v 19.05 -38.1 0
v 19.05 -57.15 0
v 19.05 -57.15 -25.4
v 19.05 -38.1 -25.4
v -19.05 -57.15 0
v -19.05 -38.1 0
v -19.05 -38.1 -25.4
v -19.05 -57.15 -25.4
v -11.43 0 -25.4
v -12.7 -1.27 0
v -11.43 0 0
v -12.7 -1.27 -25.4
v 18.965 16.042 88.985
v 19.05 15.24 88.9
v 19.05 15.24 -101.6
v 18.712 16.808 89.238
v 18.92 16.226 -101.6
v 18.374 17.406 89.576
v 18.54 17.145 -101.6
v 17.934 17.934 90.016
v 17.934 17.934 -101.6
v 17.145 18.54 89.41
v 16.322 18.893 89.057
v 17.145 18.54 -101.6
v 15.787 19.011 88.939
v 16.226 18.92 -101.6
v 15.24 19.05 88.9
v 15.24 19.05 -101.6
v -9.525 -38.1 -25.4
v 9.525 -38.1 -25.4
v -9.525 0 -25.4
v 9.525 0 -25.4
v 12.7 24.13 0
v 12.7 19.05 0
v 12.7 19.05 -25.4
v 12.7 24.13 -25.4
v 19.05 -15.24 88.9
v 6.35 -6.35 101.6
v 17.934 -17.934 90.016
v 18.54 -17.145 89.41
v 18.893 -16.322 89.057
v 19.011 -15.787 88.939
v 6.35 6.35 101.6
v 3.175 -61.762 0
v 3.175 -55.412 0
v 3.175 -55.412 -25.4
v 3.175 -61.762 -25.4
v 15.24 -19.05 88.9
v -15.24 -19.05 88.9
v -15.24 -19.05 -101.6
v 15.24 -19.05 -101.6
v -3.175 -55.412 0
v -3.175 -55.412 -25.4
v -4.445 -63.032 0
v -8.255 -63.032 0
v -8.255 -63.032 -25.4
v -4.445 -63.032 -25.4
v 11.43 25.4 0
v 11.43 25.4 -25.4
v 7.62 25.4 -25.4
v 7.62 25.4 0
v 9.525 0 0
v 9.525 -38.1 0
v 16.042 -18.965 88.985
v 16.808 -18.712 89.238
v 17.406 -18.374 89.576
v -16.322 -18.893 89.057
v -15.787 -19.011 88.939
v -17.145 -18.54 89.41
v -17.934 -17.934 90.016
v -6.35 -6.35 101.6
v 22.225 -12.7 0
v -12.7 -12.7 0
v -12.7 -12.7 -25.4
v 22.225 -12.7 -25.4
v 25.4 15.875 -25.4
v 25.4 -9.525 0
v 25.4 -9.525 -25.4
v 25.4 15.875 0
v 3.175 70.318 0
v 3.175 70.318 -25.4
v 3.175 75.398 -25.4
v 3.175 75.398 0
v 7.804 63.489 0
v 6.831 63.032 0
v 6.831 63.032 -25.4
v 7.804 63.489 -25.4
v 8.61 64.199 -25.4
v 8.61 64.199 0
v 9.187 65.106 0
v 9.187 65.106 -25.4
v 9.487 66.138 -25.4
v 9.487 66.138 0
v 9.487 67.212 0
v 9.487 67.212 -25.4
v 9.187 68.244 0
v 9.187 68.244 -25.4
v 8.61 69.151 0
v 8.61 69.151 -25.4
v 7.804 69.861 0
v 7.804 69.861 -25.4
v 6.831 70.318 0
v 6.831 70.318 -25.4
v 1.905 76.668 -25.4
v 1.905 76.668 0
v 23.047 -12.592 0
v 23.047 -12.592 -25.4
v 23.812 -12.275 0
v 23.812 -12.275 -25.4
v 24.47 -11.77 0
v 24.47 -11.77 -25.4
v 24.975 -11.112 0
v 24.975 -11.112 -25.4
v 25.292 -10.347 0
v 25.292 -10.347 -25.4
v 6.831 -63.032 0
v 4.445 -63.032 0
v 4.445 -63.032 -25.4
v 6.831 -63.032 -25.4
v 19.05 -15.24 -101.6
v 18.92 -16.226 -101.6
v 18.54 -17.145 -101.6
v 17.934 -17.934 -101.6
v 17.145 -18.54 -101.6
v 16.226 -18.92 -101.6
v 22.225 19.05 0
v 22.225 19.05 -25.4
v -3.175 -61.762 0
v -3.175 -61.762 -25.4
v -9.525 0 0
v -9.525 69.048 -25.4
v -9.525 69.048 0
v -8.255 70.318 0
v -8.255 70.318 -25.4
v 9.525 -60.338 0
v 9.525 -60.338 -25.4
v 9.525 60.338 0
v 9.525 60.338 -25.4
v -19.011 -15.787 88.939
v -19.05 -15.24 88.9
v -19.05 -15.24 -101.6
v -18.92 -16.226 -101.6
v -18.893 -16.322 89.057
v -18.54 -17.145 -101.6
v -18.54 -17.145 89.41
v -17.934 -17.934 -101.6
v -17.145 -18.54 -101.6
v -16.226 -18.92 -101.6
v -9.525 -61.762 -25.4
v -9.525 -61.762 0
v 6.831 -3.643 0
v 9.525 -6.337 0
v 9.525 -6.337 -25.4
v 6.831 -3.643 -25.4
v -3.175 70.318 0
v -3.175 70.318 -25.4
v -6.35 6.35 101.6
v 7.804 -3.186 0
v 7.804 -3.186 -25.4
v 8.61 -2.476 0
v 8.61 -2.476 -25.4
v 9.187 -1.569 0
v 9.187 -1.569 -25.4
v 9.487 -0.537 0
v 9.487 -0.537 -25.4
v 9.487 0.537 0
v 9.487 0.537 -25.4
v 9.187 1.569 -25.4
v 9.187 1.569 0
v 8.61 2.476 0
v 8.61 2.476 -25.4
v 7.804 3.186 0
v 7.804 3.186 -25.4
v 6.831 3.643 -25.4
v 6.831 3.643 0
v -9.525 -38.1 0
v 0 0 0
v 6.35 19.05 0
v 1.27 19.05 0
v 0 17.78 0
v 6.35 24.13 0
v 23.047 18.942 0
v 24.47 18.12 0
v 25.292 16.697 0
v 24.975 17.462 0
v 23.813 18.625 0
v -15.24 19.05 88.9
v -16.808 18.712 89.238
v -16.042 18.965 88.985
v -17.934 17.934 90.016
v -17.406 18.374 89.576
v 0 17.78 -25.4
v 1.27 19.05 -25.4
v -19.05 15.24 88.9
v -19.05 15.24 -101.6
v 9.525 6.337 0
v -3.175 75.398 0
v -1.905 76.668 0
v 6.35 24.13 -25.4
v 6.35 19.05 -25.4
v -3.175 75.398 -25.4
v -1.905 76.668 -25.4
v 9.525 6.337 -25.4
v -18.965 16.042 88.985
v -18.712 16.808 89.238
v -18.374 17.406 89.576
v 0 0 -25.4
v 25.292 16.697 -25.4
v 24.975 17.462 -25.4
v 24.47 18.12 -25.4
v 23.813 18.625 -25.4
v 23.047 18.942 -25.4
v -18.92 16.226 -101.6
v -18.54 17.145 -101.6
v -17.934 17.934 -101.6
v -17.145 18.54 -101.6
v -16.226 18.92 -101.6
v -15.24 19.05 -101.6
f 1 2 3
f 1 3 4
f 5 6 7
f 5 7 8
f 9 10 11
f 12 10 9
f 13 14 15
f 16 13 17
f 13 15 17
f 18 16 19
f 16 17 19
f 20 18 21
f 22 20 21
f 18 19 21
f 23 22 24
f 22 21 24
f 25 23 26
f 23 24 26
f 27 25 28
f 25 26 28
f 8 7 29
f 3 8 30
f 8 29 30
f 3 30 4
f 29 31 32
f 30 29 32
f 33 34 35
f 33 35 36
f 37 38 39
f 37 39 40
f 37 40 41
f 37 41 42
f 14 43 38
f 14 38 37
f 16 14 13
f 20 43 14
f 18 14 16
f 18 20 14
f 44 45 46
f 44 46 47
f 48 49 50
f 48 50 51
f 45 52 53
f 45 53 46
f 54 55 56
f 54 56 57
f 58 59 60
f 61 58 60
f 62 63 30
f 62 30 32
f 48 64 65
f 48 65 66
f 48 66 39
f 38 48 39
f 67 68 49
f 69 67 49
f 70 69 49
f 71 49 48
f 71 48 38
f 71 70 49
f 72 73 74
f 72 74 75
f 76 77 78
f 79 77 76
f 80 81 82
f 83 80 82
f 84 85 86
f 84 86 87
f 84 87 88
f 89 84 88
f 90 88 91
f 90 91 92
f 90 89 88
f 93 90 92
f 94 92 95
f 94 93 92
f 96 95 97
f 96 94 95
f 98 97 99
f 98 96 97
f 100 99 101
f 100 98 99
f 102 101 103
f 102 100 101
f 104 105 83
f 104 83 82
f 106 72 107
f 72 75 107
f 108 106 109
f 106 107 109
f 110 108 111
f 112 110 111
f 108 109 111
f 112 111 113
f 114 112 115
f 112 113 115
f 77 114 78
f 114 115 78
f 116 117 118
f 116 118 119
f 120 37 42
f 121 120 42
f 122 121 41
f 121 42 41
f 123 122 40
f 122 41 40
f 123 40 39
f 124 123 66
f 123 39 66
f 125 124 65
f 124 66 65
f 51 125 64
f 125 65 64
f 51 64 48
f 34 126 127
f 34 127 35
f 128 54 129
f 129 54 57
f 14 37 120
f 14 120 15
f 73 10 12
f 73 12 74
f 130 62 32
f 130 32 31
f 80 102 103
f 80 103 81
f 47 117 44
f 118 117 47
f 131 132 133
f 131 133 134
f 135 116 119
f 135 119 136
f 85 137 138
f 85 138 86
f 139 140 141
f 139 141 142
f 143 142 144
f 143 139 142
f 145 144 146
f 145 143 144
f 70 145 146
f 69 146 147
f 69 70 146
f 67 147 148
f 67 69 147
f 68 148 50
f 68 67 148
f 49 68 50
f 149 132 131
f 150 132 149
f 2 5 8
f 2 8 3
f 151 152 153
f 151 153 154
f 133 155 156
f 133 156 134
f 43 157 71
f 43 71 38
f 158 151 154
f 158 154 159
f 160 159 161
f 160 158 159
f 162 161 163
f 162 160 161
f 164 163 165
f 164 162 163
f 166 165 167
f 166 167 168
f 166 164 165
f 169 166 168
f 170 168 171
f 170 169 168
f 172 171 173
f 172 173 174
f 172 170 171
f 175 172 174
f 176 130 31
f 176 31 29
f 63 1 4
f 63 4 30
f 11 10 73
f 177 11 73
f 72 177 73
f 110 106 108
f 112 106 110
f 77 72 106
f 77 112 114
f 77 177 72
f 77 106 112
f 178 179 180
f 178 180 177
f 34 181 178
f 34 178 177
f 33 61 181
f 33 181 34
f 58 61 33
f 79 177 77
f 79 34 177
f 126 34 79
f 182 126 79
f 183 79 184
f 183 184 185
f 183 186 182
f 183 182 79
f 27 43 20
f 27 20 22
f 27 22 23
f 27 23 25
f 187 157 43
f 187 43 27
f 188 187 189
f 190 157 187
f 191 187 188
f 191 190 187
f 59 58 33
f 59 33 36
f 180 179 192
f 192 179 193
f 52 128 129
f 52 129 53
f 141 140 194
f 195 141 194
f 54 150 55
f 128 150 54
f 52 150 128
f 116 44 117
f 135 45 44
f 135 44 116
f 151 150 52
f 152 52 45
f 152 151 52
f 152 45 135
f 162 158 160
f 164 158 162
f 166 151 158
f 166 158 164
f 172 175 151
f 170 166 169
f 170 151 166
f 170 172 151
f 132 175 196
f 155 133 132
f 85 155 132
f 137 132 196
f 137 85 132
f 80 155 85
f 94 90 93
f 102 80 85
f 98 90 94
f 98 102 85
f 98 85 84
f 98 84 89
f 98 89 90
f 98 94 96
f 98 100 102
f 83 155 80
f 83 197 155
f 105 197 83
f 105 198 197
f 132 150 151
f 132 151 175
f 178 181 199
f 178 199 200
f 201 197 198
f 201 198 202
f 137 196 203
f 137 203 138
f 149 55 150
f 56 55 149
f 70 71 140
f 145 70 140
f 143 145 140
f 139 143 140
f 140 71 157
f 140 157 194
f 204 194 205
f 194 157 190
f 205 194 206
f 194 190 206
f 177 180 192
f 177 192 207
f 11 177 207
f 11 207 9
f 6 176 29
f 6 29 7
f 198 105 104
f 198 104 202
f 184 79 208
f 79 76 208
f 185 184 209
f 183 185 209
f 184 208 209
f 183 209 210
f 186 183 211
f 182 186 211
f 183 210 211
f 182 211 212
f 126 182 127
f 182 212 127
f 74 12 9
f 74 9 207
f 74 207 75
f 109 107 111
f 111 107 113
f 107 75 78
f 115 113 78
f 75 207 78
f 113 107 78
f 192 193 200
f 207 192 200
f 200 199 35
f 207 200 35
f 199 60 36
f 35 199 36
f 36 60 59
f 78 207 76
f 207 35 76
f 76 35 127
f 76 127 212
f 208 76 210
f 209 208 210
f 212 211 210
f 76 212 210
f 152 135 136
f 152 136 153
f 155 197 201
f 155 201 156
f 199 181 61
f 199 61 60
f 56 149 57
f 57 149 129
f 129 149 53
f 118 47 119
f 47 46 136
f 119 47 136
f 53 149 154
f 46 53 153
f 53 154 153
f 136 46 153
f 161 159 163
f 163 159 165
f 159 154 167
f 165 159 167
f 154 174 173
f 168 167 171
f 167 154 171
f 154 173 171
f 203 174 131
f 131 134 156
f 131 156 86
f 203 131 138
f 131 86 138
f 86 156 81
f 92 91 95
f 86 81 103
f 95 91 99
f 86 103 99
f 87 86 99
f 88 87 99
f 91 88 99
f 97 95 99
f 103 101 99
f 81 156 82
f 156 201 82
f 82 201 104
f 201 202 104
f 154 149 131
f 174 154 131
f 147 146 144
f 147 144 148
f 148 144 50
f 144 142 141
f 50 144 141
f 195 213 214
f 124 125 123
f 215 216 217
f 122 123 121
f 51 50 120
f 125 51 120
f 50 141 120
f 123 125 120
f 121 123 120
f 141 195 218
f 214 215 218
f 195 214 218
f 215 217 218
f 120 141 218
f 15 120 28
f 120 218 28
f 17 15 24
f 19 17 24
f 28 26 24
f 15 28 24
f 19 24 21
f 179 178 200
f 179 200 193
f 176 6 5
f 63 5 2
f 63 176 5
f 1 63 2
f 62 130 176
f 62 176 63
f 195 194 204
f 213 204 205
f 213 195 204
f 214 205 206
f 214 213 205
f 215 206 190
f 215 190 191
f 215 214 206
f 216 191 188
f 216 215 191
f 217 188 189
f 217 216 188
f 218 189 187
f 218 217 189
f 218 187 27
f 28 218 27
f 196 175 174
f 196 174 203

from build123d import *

# Parameters (mm, degrees)
F1_DEPTH      = 25.4
F2_SIZE       = 1.27
F4_DEPTH      = 25.4
F5_SIZE       = 1.27
F6_R          = 3.175
F7_W          = 38.1
F7_H          = 38.1
F8_DEPTH      = 101.6
F9_R          = 3.81
F10_T1_DEPTH  = 95.8007478943
F10_T3_DEPTH  = 95.8007478943
F10_T8_ANGLE  = 90
F10_T13_ANGLE = 90
F10_T18_ANGLE = 90
F10_T23_ANGLE = 90
F10_T28_ANGLE = 90
F10_T33_ANGLE = 90
F10_T38_ANGLE = 90
F10_T43_ANGLE = 90
F12_DEPTH     = 25.4


# Not quite as in the source:
# - a fillet or chamfer that OpenCascade refuses, or shapes differently, is made with other operations: its cross-section is extruded or revolved along the edge and cut away or added


with BuildPart() as f1:
    # F0 (on Top) → F1 (new body)
    with BuildSketch(Plane.XY):
        with BuildLine():
            Line((-3.175, -63.0320869496), (-3.175, -55.4120869496))
            Line((-3.175, -55.4120869496), (3.175, -55.4120869496))
            Line((3.175, -55.4120869496), (3.175, -63.0320869496))
            Line((3.175, -63.0320869496), (6.8309231637, -63.0320869496))
            Line((6.8309231637, -63.0320869496), (9.525, -60.3380101133))
            Line((9.525, -60.3380101133), (9.525, -6.3369898867))
            Line((9.525, -6.3369898867), (6.8309231637, -3.6429130504))
            ThreePointArc((6.8309231637, -3.6429130504), (9.525, 0), (6.8309231637, 3.6429130504))
            Line((6.8309231637, 3.6429130504), (9.525, 6.3369898867))
            Line((9.525, 6.3369898867), (9.525, 60.3380101133))
            Line((9.525, 60.3380101133), (6.8309231637, 63.0320869496))
            ThreePointArc((6.8309231637, 63.0320869496), (9.525, 66.675), (6.8309231637, 70.3179130504))
            Line((6.8309231637, 70.3179130504), (3.175, 70.3179130504))
            Line((3.175, 70.3179130504), (3.175, 76.6679130504))
            Line((3.175, 76.6679130504), (-3.175, 76.6679130504))
            Line((-3.175, 76.6679130504), (-3.175, 70.3179130504))
            Line((-3.175, 70.3179130504), (-9.525, 70.3179130504))
            Line((-9.525, 70.3179130504), (-9.525, -63.0320869496))
            Line((-9.525, -63.0320869496), (-3.175, -63.0320869496))
        make_face()
    extrude(amount=-F1_DEPTH)

    # F2
    f2_edges = [f1.edges().sort_by_distance(p)[0] for p in [
        (-3.175, 76.667913, -12.7),
        (-9.525, 70.317913, -12.7),
        (3.175, 76.667913, -12.7),
        (-9.525, -63.032087, -12.7),
        (-3.175, -63.032087, -12.7),
        (3.175, -63.032087, -12.7),
    ]]
    chamfer(f2_edges, length=F2_SIZE)


with BuildPart() as f4:
    # F3 (on Top) → F4 (new body)
    with BuildSketch(Plane.XY):
        Polygon((0, 19.05), (0, 0), (-12.7, 0), (-12.7, -12.7), (25.4, -12.7), (25.4, 19.05), (12.7, 19.05), (12.7, 25.4), (6.35, 25.4), (6.35, 19.05), align=None)
    extrude(amount=-F4_DEPTH)

    # F5
    f5_edges = [f4.edges().sort_by_distance(p)[0] for p in [
        (12.7, 25.4, -12.7),
        (6.35, 25.4, -12.7),
        (0, 19.05, -12.7),
        (-12.7, 0, -12.7),
    ]]
    chamfer(f5_edges, length=F5_SIZE)

    # F6
    f6_edges = [f4.edges().sort_by_distance(p)[0] for p in [
        (25.4, 19.05, -12.7),
        (25.4, -12.7, -12.7),
    ]]
    fillet(f6_edges, radius=F6_R)


with BuildPart() as f8:
    # F7 (on Top) → F8 (new body, symmetric)
    with BuildSketch(Plane.XY):
        Rectangle(F7_W, F7_H)
    extrude(amount=F8_DEPTH, both=True)

    # F9
    f9_edges = [f8.edges().sort_by_distance(p)[0] for p in [
        (-19.05, -19.05, 0),
        (19.05, -19.05, 0),
        (19.05, 19.05, 0),
        (-19.05, 19.05, 0),
    ]]
    fillet(f9_edges, radius=F9_R)

    # F10: chamfer of 12.7 on 4 edges, made by hand

    # F10_s2 → F10_t1 (cut)
    with BuildSketch(Plane.YZ.offset(-47.9003739472)):
        Polygon((6.35, 101.6), (19.05, 88.9), (19.05, 101.6), align=None)
        Polygon((-19.05, 88.9), (-6.35, 101.6), (-19.05, 101.6), align=None)
    extrude(amount=F10_T1_DEPTH, mode=Mode.SUBTRACT)

    # F10_s4 → F10_t3 (cut)
    with BuildSketch(Plane.XZ.offset(-47.9003739472)):
        Polygon((-6.35, 101.6), (-19.05, 88.9), (-19.05, 101.6), align=None)
        Polygon((6.35, 101.6), (19.05, 88.9), (19.05, 101.6), align=None)
    extrude(amount=F10_T3_DEPTH, mode=Mode.SUBTRACT)


with BuildPart() as f10_tool6:
    # F10_s7 → F10_t8 (revolve)
    with BuildSketch(Plane.YZ.offset(15.24)):
        Polygon((-19.05, 88.9), (-15.24, 92.71), (-15.24, 101.6), (-19.05, 101.6), align=None)
    revolve(axis=Axis((15.24, -15.24, 101.6), (0, 0, 1)), revolution_arc=F10_T8_ANGLE)

    split(bisect_by=Plane(origin=(0, -53.975, 53.975), x_dir=(1, 0, 0), z_dir=(0, -0.7071067812, 0.7071067812)), keep=Keep.TOP)


with BuildPart() as f8_1:
    add(f8.part)

    # F10_t5: cut F10_tool6
    add(f10_tool6.part, mode=Mode.SUBTRACT)


with BuildPart() as f10_tool11:
    # F10_s12 → F10_t13 (revolve)
    with BuildSketch(Plane.YZ.offset(15.24)):
        Polygon((-19.05, 88.9), (-15.24, 92.71), (-15.24, 101.6), (-19.05, 101.6), align=None)
    revolve(axis=Axis((15.24, -15.24, 101.6), (0, 0, 1)), revolution_arc=F10_T13_ANGLE)

    split(bisect_by=Plane(origin=(53.975, 0, 53.975), x_dir=(0, 1, 0), z_dir=(0.7071067812, 0, 0.7071067812)), keep=Keep.TOP)


with BuildPart() as f8_2:
    add(f8_1.part)

    # F10_t10: cut F10_tool11
    add(f10_tool11.part, mode=Mode.SUBTRACT)


with BuildPart() as f10_tool16:
    # F10_s17 → F10_t18 (revolve)
    with BuildSketch(Plane.YZ.offset(15.24)):
        Polygon((15.24, 92.71), (19.05, 88.9), (19.05, 101.6), (15.24, 101.6), align=None)
    revolve(axis=Axis((15.24, 15.24, 101.6), (0, 0, -1)), revolution_arc=F10_T18_ANGLE)

    split(bisect_by=Plane(origin=(0, 53.975, 53.975), x_dir=(1, 0, 0), z_dir=(0, 0.7071067812, 0.7071067812)), keep=Keep.TOP)


with BuildPart() as f8_3:
    add(f8_2.part)

    # F10_t15: cut F10_tool16
    add(f10_tool16.part, mode=Mode.SUBTRACT)


with BuildPart() as f10_tool21:
    # F10_s22 → F10_t23 (revolve)
    with BuildSketch(Plane.YZ.offset(15.24)):
        Polygon((15.24, 92.71), (19.05, 88.9), (19.05, 101.6), (15.24, 101.6), align=None)
    revolve(axis=Axis((15.24, 15.24, 101.6), (0, 0, -1)), revolution_arc=F10_T23_ANGLE)

    split(bisect_by=Plane(origin=(53.975, 0, 53.975), x_dir=(0, 1, 0), z_dir=(0.7071067812, 0, 0.7071067812)), keep=Keep.TOP)


with BuildPart() as f8_4:
    add(f8_3.part)

    # F10_t20: cut F10_tool21
    add(f10_tool21.part, mode=Mode.SUBTRACT)


with BuildPart() as f10_tool26:
    # F10_s27 → F10_t28 (revolve)
    with BuildSketch(Plane.YZ.offset(-15.24)):
        Polygon((-19.05, 88.9), (-15.24, 92.71), (-15.24, 101.6), (-19.05, 101.6), align=None)
    revolve(axis=Axis((-15.24, -15.24, 101.6), (0, 0, -1)), revolution_arc=F10_T28_ANGLE)

    split(bisect_by=Plane(origin=(0, -53.975, 53.975), x_dir=(1, 0, 0), z_dir=(0, -0.7071067812, 0.7071067812)), keep=Keep.TOP)


with BuildPart() as f8_5:
    add(f8_4.part)

    # F10_t25: cut F10_tool26
    add(f10_tool26.part, mode=Mode.SUBTRACT)


with BuildPart() as f10_tool31:
    # F10_s32 → F10_t33 (revolve)
    with BuildSketch(Plane.YZ.offset(-15.24)):
        Polygon((-19.05, 88.9), (-15.24, 92.71), (-15.24, 101.6), (-19.05, 101.6), align=None)
    revolve(axis=Axis((-15.24, -15.24, 101.6), (0, 0, -1)), revolution_arc=F10_T33_ANGLE)

    split(bisect_by=Plane(origin=(-53.975, 0, 53.975), x_dir=(0, 1, 0), z_dir=(-0.7071067812, 0, 0.7071067812)), keep=Keep.TOP)


with BuildPart() as f8_6:
    add(f8_5.part)

    # F10_t30: cut F10_tool31
    add(f10_tool31.part, mode=Mode.SUBTRACT)


with BuildPart() as f10_tool36:
    # F10_s37 → F10_t38 (revolve)
    with BuildSketch(Plane.XZ.offset(-15.24)):
        Polygon((-15.24, 92.71), (-19.05, 88.9), (-19.05, 101.6), (-15.24, 101.6), align=None)
    revolve(axis=Axis((-15.24, 15.24, 101.6), (0, 0, -1)), revolution_arc=F10_T38_ANGLE)

    split(bisect_by=Plane(origin=(-53.975, 0, 53.975), x_dir=(0, 1, 0), z_dir=(-0.7071067812, 0, 0.7071067812)), keep=Keep.TOP)


with BuildPart() as f8_7:
    add(f8_6.part)

    # F10_t35: cut F10_tool36
    add(f10_tool36.part, mode=Mode.SUBTRACT)


with BuildPart() as f10_tool41:
    # F10_s42 → F10_t43 (revolve)
    with BuildSketch(Plane.XZ.offset(-15.24)):
        Polygon((-15.24, 92.71), (-19.05, 88.9), (-19.05, 101.6), (-15.24, 101.6), align=None)
    revolve(axis=Axis((-15.24, 15.24, 101.6), (0, 0, -1)), revolution_arc=F10_T43_ANGLE)

    split(bisect_by=Plane(origin=(0, 53.975, 53.975), x_dir=(1, 0, 0), z_dir=(0, 0.7071067812, 0.7071067812)), keep=Keep.TOP)


with BuildPart() as f8_8:
    add(f8_7.part)

    # F10_t40: cut F10_tool41
    add(f10_tool41.part, mode=Mode.SUBTRACT)


with BuildPart() as f12:
    # F11 (on Top) → F12 (new body)
    with BuildSketch(Plane.XY):
        Polygon((19.05, -57.15), (19.05, -38.1), (9.525, -38.1), (9.525, 0), (-9.525, 0), (-9.525, -38.1), (-19.05, -38.1), (-19.05, -57.15), align=None)
    extrude(amount=-F12_DEPTH)


solid = Compound([f1.part, f4.part, f8_8.part, f12.part])
